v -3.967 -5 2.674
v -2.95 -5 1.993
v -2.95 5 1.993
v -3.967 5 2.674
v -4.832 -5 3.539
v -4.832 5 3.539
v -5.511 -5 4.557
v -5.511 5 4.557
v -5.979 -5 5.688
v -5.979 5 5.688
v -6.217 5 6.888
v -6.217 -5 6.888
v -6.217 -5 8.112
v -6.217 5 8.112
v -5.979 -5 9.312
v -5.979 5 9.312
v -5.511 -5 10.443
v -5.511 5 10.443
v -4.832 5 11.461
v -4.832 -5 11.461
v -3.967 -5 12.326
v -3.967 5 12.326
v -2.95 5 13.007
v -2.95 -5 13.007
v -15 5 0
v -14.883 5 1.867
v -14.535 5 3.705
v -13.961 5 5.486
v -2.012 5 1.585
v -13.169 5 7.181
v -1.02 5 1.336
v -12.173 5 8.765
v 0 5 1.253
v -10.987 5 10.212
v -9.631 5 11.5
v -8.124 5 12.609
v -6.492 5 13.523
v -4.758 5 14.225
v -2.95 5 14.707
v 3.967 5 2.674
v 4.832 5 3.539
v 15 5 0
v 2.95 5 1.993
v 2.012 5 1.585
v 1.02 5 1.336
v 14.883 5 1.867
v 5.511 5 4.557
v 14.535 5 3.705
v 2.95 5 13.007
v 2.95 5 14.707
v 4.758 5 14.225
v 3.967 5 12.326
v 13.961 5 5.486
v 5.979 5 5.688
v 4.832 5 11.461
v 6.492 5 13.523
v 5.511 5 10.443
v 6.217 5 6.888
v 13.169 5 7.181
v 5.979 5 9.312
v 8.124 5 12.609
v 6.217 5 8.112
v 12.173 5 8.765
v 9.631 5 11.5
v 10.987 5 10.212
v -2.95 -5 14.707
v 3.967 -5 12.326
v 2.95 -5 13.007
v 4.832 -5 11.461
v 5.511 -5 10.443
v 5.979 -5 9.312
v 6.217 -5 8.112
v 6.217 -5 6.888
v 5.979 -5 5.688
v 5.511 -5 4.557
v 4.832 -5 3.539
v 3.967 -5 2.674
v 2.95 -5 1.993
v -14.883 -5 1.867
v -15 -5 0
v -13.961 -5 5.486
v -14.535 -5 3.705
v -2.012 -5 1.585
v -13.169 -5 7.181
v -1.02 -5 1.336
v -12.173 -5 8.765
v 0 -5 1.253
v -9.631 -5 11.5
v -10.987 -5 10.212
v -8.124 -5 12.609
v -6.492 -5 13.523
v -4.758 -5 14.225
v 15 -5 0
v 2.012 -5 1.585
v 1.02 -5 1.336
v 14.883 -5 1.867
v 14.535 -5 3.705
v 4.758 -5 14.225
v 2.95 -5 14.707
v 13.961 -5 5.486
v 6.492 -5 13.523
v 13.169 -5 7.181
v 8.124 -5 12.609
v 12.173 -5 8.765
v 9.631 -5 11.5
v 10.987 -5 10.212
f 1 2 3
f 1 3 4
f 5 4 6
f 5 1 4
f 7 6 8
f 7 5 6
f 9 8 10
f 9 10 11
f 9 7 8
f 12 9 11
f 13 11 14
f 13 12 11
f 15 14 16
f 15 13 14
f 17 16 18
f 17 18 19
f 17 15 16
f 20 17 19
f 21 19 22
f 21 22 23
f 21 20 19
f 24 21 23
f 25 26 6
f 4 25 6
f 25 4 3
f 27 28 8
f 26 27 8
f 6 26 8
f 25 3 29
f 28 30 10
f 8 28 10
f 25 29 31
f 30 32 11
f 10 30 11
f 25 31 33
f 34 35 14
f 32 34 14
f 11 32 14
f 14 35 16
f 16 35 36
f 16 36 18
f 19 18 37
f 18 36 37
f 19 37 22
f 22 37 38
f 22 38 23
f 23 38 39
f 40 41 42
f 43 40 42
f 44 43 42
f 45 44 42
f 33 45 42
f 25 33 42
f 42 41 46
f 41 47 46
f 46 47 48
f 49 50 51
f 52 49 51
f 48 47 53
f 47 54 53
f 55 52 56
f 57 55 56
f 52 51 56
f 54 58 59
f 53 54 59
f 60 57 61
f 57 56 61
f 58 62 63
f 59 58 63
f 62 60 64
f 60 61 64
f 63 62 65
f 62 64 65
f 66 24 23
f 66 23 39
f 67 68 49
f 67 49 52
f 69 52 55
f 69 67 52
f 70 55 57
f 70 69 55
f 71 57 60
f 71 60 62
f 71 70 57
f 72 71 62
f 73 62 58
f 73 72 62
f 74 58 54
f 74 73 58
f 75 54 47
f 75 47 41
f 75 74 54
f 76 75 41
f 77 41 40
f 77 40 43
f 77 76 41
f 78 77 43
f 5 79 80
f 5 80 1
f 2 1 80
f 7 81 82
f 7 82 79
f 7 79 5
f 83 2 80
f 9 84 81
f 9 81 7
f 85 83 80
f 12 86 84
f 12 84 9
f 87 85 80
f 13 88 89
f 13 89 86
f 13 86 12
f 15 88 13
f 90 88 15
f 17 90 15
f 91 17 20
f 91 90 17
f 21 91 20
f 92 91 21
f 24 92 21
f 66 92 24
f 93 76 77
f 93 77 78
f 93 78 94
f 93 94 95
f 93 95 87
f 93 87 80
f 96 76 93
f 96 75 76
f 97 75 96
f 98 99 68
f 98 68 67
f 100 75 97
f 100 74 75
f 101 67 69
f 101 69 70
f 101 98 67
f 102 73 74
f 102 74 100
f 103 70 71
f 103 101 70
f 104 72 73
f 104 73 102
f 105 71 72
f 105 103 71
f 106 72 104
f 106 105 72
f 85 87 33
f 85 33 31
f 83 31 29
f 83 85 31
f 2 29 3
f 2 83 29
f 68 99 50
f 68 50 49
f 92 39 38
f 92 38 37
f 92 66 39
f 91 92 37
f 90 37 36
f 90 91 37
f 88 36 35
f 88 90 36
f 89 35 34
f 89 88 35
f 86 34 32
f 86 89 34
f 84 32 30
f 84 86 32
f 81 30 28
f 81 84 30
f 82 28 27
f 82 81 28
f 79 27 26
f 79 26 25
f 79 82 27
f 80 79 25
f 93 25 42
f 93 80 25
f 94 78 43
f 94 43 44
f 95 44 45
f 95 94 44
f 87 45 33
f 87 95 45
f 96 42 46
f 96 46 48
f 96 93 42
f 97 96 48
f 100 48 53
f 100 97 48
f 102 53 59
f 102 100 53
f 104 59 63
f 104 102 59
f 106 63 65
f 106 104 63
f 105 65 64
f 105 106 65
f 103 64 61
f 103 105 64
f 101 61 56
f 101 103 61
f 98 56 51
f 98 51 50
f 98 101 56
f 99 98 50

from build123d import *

# Parameters (mm, degrees)
F1_DEPTH = 5


with BuildPart() as f1:
    # F0 (on Front) → F1 (new body, symmetric)
    with BuildSketch(Plane.XZ):
        with BuildLine():
            Line((-2.95, 0), (0, 0))
            Line((0, 0), (0, 1.252587))
            ThreePointArc((0, 1.252587), (-1.520742, 1.440502), (-2.95, 1.992944))
            Line((-2.95, 1.992944), (-2.95, 0))
        make_face()
        with BuildLine():
            Line((0, 0), (2.95, 0))
            Line((2.95, 0), (2.95, 1.992944))
            ThreePointArc((2.95, 1.992944), (1.520742, 1.440502), (0, 1.252587))
            Line((0, 1.252587), (0, 0))
        make_face()
        with BuildLine():
            Line((2.95, 0), (15, 0))
            ThreePointArc((15, 0), (11.602801, 9.506577), (2.95, 14.707056))
            Line((2.95, 14.707056), (2.95, 13.007056))
            ThreePointArc((2.95, 13.007056), (6.247413, 7.5), (2.95, 1.992944))
            Line((2.95, 1.992944), (2.95, 0))
        make_face()
        with BuildLine():
            Line((-15, 0), (-2.95, 0))
            Line((-2.95, 0), (-2.95, 1.992944))
            ThreePointArc((-2.95, 1.992944), (-6.247413, 7.5), (-2.95, 13.007056))
            Line((-2.95, 13.007056), (-2.95, 13.857056))
            Line((-2.95, 13.857056), (-2.95, 14.707056))
            ThreePointArc((-2.95, 14.707056), (-11.602801, 9.506577), (-15, 0))
        make_face()
    extrude(amount=F1_DEPTH, both=True)


solid = f1.part
